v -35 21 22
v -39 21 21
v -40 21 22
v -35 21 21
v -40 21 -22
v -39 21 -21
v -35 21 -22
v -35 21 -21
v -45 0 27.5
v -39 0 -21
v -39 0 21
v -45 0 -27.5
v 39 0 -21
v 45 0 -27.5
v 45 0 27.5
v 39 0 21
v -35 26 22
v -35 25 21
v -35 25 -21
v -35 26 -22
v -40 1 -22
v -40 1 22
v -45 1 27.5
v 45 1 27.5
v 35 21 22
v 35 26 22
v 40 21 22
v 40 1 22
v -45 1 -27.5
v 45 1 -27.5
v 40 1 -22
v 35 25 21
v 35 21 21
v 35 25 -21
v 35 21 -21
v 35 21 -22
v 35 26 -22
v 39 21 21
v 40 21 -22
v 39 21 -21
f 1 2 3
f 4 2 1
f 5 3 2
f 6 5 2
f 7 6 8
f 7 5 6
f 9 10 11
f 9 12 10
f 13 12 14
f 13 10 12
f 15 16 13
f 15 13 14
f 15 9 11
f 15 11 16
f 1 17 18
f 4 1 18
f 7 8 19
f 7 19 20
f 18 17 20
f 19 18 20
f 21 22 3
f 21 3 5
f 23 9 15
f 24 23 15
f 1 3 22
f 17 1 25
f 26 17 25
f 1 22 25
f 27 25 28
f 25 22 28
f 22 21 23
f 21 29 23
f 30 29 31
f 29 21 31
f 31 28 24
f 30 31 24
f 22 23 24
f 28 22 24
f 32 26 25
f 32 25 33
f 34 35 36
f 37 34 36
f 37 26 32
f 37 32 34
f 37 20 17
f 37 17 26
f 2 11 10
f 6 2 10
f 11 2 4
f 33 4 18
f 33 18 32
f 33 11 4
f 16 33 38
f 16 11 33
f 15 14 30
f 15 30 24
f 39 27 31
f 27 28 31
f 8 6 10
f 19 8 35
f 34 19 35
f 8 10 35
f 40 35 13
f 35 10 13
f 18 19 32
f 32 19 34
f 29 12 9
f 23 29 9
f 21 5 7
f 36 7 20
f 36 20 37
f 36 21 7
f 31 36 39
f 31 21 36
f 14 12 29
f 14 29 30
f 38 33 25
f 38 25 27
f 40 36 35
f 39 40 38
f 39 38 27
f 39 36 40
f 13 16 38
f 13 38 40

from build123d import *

# Parameters (mm, degrees)
SKETCH_1_W          = 78
SKETCH_1_H          = 42
EXTRUDE_1_DEPTH     = 25
SHELL_1_T           = 1
SKETCH_2_W          = 90
SKETCH_2_H          = 55
SKETCH_2_W_2        = 80
SKETCH_2_H_2        = 44
EXTRUDE_2_DEPTH     = 1
SKETCH_3_W          = 5
SKETCH_3_H          = 44
CUT_EXTRUDE_1_DEPTH = 5


with BuildPart() as part:
    # 草图1 → 凸台-拉伸1 (new body)
    with BuildSketch(Plane(origin=(0, 0, 0), x_dir=(1, 0, 0), z_dir=(0, 1, 0))):
        Rectangle(SKETCH_1_W, SKETCH_1_H)
    extrude(amount=EXTRUDE_1_DEPTH)

    # 抽壳1
    shell_1_openings = [part.faces().sort_by_distance(p)[0] for p in [
        (0, 0, 0),
    ]]
    offset(amount=SHELL_1_T, openings=shell_1_openings, kind=Kind.INTERSECTION)

    # 草图2 → 凸台-拉伸2 (add)
    with BuildSketch(Plane.XZ):
        Rectangle(SKETCH_2_W, SKETCH_2_H)
        Rectangle(SKETCH_2_W_2, SKETCH_2_H_2, mode=Mode.SUBTRACT)
    extrude(amount=-EXTRUDE_2_DEPTH)

    # 草图3 → 切除-拉伸1 (cut)
    with BuildSketch(Plane(origin=(0, 26, 0), x_dir=(1, 0, 0), z_dir=(0, 1, 0))):
        with Locations((-37.5, 0)):
            Rectangle(SKETCH_3_W, SKETCH_3_H)
        with Locations((37.5, 0)):
            Rectangle(SKETCH_3_W, SKETCH_3_H)
    extrude(amount=-CUT_EXTRUDE_1_DEPTH, mode=Mode.SUBTRACT)


solid = part.part
